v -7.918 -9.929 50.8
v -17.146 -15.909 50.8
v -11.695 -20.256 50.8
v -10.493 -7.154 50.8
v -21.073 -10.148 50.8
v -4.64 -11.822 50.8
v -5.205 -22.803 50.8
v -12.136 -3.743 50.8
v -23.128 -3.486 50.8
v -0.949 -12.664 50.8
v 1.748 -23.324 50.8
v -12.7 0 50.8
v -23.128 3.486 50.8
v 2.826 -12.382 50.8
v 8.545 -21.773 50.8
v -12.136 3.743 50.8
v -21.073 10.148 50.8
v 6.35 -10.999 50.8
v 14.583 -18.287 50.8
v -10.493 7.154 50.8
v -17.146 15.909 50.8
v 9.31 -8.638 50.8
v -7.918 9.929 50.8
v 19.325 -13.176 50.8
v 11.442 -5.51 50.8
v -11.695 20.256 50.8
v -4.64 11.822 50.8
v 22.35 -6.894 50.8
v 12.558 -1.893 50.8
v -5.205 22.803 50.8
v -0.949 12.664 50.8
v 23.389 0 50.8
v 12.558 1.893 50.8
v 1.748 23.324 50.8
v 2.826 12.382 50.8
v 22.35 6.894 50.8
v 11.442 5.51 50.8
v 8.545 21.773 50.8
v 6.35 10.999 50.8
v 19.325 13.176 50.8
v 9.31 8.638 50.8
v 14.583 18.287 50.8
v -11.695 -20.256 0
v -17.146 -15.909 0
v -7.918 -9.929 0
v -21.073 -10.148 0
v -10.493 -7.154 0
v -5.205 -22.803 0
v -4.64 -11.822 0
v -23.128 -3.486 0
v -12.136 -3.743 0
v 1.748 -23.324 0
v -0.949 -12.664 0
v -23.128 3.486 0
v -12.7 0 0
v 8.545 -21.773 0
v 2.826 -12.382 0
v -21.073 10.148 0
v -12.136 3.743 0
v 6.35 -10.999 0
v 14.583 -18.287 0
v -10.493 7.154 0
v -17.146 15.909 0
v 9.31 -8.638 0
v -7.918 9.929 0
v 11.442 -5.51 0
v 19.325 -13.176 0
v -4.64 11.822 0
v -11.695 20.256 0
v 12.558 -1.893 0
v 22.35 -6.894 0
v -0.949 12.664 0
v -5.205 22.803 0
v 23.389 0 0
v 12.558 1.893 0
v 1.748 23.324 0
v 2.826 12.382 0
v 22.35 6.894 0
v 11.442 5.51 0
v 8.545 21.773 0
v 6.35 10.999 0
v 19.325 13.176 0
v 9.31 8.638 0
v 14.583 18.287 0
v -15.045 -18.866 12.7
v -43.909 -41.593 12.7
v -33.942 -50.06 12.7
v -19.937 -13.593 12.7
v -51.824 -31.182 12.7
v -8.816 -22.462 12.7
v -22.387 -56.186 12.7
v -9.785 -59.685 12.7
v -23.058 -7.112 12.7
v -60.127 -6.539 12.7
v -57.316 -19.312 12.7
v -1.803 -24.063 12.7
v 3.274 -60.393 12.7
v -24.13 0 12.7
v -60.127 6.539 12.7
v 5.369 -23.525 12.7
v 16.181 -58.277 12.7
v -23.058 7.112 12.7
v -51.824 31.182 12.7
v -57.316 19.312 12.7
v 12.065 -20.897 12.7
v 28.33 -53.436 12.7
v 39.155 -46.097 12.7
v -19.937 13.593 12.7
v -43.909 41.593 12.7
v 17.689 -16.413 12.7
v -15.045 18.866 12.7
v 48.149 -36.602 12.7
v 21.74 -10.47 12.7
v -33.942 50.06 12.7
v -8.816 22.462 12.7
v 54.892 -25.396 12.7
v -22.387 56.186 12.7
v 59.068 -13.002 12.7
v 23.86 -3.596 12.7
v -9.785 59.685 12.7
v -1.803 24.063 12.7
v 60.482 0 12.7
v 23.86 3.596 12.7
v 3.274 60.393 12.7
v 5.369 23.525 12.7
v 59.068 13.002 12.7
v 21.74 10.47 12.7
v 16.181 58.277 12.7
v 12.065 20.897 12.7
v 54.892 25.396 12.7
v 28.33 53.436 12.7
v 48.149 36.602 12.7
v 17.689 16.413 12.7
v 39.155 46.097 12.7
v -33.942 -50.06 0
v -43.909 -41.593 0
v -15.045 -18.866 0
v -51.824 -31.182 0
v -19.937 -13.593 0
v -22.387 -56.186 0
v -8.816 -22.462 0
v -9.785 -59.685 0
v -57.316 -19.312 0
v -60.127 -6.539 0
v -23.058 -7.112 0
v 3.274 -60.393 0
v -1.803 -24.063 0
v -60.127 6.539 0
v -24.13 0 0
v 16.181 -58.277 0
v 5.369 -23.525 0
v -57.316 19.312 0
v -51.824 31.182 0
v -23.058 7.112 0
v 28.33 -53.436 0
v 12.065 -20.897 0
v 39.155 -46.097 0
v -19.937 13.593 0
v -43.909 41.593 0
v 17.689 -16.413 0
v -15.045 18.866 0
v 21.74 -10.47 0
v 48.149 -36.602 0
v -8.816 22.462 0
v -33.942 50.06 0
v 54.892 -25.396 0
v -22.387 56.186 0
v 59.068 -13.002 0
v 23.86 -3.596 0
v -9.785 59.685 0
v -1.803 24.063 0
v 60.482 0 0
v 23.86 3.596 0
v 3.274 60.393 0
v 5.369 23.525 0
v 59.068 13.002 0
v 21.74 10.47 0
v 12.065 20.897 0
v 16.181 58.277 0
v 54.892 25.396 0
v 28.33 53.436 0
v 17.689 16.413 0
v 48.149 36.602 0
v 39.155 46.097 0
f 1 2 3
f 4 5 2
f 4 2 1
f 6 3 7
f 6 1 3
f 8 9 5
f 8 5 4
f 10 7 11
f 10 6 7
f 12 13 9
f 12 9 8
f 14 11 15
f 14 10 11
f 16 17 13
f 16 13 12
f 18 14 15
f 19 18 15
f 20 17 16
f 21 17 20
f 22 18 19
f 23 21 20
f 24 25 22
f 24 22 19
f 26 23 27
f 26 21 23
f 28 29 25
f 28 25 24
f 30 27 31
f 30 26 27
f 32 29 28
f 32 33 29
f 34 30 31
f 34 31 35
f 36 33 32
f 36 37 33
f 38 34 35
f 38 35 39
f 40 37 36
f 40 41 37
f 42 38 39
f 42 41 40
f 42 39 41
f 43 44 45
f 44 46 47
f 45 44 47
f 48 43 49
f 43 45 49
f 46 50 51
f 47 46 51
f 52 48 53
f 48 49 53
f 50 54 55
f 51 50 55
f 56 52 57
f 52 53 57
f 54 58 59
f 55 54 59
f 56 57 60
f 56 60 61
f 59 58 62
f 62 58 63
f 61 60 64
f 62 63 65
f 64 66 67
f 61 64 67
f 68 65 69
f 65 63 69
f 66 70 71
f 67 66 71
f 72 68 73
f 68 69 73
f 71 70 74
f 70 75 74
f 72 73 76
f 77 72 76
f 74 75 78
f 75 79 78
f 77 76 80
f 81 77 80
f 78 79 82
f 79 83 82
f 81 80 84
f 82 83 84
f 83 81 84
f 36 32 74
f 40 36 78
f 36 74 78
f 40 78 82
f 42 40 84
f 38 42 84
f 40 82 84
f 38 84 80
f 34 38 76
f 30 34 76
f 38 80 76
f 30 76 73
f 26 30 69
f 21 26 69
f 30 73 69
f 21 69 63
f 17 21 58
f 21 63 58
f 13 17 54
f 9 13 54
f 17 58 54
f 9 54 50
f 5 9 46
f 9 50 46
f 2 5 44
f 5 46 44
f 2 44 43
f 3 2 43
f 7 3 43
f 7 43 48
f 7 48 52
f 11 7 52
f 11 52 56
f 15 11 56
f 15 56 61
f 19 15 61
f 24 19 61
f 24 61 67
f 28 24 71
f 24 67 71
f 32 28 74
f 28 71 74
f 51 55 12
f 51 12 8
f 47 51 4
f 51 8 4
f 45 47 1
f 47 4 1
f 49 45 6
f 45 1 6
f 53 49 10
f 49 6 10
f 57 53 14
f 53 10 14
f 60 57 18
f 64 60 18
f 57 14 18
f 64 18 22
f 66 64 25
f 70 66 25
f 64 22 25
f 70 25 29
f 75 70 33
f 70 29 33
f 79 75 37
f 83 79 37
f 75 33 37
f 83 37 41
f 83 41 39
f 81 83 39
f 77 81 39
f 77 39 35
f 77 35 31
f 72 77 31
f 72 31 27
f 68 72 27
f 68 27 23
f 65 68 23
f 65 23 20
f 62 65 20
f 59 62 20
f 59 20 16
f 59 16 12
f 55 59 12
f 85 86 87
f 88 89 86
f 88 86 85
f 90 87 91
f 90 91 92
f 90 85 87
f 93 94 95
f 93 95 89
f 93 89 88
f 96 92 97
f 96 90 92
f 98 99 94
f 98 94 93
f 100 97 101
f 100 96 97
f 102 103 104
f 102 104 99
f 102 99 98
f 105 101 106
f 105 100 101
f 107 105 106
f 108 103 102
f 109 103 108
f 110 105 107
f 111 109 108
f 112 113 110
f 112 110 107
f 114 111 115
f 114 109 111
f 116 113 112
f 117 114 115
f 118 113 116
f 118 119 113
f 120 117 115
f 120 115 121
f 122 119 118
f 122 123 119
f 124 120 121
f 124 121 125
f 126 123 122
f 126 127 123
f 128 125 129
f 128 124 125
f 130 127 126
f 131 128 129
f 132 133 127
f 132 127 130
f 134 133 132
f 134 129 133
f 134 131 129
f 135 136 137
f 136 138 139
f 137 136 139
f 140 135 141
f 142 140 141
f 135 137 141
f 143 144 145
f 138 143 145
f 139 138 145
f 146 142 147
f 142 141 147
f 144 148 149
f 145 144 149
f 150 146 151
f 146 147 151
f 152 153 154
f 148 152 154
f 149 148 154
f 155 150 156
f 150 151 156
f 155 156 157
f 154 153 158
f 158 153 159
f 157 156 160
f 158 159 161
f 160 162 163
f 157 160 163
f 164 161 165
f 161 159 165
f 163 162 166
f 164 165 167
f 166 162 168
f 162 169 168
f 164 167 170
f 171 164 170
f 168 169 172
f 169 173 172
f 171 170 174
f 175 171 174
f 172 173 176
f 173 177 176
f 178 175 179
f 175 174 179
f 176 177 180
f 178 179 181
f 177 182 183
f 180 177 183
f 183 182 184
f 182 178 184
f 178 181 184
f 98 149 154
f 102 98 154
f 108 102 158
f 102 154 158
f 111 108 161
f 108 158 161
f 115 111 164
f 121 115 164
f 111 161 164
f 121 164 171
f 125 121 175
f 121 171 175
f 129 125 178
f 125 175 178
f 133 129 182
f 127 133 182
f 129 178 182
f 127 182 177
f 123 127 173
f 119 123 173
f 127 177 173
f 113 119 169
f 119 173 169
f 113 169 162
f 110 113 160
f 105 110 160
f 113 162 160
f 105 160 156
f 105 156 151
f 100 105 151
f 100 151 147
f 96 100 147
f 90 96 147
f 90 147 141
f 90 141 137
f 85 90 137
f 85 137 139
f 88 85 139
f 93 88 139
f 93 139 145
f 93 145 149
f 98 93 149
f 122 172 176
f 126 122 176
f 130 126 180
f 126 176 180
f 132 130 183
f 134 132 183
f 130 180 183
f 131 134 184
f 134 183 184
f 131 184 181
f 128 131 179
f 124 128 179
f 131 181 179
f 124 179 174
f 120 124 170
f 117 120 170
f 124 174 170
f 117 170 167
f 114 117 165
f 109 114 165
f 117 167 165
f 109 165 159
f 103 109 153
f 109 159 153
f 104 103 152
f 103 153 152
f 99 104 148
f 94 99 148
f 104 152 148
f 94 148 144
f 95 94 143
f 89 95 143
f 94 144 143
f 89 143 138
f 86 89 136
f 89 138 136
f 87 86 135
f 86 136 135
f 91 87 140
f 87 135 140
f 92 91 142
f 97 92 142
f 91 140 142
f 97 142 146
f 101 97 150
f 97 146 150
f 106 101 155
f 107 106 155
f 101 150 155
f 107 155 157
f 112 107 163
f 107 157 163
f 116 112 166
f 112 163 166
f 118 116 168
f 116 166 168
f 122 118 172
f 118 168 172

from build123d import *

# Parameters (mm, degrees)
F0_R     = 60.48165
F1_DEPTH = 12.7
F3_D     = 48.26
F4_R     = 23.389423
F5_DEPTH = 50.8
F7_D     = 25.4


with BuildPart() as f1:
    # F0 (on Top) → F1 (new body)
    with BuildSketch(Plane.XY):
        Circle(F0_R)
    extrude(amount=F1_DEPTH)

    # F3 (through all)
    with Locations(Plane.XY.offset(12.7)):
        with Locations((0, 0)):
            Hole(F3_D / 2)


with BuildPart() as f5:
    # F4 (on Top) → F5 (new body)
    with BuildSketch(Plane.XY):
        Circle(F4_R)
    extrude(amount=F5_DEPTH)

    # F7 (through all)
    with Locations(Plane(origin=(0, 0, 0), x_dir=(1, 0, 0), z_dir=(0, 0, -1))):
        with Locations((0, 0)):
            Hole(F7_D / 2)


solid = Compound([f1.part, f5.part])
